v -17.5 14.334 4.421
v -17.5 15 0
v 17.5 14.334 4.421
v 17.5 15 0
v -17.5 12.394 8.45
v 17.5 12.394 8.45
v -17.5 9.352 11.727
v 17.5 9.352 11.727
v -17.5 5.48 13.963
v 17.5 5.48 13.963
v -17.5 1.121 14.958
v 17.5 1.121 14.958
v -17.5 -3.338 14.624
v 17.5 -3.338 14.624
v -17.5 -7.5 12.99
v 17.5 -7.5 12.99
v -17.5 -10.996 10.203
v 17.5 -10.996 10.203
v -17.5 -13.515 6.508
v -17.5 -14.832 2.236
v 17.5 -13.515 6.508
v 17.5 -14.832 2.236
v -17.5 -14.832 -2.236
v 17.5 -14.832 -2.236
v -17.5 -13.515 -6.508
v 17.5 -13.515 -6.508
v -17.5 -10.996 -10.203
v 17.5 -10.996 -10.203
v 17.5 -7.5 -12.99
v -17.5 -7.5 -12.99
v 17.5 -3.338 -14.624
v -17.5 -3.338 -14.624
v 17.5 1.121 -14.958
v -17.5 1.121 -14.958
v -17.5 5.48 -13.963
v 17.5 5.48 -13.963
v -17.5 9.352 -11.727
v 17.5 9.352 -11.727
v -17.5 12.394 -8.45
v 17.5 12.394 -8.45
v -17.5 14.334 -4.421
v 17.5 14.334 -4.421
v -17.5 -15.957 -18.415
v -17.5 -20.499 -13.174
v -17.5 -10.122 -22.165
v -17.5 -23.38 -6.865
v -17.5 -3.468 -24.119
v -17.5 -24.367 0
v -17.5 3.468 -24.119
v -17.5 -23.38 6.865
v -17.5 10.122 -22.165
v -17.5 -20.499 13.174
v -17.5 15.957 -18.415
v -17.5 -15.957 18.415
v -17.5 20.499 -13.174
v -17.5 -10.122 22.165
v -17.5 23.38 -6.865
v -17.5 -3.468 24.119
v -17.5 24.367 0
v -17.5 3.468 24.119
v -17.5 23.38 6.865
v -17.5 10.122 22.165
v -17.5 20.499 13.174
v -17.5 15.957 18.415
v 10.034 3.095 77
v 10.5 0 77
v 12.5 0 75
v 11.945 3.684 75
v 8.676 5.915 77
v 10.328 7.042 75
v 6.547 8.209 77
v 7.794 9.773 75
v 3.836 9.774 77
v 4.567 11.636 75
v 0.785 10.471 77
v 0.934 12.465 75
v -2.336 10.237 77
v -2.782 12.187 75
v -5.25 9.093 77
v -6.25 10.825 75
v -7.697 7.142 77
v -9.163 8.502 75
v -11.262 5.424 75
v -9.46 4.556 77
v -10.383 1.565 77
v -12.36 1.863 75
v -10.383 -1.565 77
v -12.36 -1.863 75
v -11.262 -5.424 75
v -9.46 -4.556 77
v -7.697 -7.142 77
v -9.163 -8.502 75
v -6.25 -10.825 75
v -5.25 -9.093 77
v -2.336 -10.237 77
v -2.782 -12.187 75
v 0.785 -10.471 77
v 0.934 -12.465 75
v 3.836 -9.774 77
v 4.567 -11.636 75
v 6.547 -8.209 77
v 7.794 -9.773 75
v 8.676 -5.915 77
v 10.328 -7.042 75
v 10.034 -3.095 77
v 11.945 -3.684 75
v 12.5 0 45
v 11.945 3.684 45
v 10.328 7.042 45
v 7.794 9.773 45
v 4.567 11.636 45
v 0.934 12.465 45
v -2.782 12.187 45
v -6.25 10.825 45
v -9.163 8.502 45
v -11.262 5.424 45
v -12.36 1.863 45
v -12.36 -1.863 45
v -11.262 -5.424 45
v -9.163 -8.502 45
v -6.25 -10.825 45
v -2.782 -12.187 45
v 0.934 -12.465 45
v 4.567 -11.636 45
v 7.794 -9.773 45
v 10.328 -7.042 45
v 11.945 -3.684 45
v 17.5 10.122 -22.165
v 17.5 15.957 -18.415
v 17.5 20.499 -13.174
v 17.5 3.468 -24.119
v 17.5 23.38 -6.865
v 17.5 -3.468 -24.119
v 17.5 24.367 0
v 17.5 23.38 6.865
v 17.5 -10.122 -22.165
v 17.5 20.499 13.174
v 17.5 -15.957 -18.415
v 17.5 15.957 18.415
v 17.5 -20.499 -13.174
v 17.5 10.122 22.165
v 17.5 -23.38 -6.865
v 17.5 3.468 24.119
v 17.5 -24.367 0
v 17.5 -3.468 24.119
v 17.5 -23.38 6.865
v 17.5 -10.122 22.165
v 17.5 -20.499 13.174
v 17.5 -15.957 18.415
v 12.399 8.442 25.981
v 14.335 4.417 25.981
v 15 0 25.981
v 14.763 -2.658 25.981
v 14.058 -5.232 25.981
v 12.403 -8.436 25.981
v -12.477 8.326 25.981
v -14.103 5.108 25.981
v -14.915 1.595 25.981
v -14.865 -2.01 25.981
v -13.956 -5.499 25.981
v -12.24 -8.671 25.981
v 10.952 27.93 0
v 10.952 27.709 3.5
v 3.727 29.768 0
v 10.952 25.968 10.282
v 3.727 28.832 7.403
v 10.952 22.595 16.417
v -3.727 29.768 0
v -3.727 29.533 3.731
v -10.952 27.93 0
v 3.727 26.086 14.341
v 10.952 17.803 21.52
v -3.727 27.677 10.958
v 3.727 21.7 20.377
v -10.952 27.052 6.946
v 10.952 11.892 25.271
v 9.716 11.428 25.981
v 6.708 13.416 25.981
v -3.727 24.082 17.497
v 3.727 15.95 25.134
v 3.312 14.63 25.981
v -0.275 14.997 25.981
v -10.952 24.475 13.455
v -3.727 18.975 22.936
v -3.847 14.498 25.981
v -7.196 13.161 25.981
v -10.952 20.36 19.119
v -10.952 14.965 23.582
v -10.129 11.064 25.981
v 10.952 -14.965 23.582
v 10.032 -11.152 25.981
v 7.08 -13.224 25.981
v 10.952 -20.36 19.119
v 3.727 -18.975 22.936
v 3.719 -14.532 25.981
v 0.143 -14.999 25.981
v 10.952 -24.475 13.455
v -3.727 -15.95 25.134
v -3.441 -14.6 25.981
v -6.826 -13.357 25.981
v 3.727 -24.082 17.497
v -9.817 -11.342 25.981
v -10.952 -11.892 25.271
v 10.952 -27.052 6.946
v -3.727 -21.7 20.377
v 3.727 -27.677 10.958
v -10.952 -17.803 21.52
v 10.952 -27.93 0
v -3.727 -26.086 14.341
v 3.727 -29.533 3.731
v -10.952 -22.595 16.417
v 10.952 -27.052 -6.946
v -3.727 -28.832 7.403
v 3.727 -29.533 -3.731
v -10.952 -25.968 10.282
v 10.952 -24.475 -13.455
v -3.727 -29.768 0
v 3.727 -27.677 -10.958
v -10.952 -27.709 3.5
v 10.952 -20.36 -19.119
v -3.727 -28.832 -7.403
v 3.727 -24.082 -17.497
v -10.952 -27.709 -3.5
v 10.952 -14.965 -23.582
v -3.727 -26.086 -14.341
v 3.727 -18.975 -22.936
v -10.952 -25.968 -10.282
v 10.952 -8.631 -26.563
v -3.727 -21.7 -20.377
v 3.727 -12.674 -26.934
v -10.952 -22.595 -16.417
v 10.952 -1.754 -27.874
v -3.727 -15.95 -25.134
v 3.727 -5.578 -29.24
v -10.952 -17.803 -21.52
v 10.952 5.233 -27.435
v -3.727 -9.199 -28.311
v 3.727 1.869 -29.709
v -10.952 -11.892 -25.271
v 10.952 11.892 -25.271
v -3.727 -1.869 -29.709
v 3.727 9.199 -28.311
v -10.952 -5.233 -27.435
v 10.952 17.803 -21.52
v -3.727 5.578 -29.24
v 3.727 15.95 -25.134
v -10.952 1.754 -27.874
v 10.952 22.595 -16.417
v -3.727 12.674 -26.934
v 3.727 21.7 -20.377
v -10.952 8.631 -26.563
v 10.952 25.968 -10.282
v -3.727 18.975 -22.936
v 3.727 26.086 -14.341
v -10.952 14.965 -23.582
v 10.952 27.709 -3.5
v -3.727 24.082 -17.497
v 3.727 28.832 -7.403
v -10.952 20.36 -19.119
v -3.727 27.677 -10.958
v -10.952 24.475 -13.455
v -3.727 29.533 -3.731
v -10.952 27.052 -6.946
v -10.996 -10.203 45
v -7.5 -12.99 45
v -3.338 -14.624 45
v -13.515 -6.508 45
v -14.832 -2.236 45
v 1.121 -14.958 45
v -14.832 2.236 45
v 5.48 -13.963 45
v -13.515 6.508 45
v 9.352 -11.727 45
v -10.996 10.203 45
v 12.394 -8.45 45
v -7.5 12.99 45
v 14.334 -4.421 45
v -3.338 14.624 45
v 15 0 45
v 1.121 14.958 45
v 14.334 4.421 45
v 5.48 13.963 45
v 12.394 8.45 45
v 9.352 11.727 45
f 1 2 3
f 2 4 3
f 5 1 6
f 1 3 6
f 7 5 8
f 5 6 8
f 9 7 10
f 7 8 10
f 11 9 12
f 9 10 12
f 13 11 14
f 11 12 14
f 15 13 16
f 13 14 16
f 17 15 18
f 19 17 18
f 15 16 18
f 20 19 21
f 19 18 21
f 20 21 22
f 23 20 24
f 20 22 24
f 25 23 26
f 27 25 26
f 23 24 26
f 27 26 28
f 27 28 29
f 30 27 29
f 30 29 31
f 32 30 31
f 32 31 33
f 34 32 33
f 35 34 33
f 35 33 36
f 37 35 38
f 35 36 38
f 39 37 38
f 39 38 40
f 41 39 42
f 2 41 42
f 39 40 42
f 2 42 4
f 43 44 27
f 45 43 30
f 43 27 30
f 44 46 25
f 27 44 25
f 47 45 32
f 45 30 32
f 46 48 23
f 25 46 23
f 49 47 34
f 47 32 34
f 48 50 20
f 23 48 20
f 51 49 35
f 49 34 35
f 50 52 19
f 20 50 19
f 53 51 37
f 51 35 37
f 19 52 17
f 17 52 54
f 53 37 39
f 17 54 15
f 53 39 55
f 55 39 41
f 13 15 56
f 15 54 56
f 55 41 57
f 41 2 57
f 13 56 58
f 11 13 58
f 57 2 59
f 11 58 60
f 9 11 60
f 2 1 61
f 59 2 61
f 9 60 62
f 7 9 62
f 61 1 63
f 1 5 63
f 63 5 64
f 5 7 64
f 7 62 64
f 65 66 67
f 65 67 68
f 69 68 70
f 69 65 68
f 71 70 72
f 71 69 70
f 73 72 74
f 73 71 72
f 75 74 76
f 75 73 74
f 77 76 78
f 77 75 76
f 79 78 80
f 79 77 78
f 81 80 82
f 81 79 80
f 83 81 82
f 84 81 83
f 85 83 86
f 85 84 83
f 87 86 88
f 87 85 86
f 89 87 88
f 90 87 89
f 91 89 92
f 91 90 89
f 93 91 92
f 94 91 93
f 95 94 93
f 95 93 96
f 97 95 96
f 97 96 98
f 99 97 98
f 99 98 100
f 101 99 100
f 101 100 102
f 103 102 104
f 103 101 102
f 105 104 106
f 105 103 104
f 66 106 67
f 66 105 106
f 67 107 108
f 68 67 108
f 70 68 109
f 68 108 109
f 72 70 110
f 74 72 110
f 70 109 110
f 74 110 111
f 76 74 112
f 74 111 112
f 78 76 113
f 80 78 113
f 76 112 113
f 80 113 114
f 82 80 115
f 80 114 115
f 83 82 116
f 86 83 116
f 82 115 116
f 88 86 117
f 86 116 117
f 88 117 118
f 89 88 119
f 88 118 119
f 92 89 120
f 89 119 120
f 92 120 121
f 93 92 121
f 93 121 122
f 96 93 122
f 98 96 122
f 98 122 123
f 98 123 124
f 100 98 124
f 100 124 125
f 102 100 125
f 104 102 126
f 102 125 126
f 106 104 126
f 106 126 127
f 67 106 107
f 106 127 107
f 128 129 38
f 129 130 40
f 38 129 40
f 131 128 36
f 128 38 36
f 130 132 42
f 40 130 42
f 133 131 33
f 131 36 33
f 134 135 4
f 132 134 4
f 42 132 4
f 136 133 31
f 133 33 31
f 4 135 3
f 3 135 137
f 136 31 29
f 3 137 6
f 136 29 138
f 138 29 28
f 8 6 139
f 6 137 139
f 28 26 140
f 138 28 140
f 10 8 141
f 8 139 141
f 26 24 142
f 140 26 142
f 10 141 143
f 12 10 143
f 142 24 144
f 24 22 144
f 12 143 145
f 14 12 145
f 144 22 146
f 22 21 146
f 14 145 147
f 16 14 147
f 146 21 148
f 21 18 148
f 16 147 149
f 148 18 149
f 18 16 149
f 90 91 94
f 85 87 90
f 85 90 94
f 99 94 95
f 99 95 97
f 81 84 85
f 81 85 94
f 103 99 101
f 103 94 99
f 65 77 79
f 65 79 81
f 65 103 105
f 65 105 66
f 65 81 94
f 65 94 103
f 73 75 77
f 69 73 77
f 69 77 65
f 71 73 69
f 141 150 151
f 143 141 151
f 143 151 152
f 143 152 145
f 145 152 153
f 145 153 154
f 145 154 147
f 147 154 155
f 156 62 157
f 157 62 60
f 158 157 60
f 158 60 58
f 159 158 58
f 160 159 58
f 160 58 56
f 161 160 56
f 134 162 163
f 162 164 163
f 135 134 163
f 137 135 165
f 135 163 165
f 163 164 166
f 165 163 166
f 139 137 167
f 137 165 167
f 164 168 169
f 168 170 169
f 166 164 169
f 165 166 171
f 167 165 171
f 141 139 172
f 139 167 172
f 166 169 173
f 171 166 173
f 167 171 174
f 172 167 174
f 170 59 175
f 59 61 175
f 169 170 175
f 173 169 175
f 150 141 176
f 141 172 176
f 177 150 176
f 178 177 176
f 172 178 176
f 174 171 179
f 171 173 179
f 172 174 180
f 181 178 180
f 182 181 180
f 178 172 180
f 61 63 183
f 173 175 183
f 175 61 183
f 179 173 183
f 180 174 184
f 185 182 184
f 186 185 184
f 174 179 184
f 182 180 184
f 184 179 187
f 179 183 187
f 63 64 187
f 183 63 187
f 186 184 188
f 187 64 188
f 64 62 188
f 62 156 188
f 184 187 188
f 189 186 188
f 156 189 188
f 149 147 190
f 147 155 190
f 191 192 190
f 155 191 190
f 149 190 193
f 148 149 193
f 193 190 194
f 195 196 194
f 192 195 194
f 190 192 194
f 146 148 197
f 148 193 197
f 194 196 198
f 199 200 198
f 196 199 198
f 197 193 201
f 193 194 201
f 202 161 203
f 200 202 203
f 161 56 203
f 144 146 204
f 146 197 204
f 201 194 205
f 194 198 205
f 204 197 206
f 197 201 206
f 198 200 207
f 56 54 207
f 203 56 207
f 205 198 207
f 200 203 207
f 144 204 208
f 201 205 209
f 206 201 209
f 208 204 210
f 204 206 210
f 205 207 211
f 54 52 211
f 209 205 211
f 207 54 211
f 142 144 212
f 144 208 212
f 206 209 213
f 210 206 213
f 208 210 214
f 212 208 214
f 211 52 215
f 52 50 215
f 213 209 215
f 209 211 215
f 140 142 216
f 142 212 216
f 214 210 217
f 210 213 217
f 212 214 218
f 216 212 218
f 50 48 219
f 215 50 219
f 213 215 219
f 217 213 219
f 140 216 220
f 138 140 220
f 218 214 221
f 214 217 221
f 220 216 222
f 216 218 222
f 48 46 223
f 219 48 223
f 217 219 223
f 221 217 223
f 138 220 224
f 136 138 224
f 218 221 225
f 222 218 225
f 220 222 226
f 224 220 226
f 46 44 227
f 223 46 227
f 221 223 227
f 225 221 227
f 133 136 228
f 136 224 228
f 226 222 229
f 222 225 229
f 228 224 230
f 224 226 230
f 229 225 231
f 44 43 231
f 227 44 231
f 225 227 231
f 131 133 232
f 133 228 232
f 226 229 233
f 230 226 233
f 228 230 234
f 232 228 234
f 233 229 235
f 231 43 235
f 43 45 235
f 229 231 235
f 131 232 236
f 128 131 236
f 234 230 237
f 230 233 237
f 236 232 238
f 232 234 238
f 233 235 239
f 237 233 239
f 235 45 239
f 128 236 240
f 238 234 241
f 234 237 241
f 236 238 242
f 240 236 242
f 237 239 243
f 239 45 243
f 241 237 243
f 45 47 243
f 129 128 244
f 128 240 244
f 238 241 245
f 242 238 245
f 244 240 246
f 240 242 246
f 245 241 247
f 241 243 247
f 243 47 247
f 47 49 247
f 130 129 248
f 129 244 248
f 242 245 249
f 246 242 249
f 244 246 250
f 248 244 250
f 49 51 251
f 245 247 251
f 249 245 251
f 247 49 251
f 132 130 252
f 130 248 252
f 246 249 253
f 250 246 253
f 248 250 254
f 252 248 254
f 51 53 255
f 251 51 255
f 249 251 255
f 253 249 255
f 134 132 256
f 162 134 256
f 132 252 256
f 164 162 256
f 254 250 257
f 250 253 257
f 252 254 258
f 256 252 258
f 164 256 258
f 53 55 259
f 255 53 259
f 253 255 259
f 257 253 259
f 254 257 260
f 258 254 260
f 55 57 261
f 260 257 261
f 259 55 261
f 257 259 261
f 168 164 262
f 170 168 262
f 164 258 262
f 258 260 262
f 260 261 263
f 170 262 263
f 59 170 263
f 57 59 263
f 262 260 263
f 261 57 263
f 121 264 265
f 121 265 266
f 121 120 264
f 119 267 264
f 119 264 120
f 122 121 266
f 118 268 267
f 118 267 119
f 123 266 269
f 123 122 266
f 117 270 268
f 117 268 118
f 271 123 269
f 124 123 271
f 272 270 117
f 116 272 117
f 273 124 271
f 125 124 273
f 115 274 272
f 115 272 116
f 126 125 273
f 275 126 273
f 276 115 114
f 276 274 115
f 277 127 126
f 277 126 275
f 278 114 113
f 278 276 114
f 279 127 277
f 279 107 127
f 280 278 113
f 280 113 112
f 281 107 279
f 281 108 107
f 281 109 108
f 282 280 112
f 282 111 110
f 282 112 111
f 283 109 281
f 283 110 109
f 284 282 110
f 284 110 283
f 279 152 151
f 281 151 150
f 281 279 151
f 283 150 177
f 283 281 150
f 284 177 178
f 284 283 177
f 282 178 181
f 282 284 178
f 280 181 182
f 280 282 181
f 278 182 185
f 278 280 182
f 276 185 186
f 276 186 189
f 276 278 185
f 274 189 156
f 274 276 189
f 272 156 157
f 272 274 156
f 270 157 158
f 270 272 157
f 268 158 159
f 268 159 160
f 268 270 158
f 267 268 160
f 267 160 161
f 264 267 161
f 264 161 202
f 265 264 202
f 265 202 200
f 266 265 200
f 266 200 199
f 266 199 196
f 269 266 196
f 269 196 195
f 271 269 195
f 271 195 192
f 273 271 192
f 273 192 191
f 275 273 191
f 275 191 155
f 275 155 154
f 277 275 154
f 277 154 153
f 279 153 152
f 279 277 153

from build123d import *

# Parameters (mm, degrees)
P_IDAT_VYSUNUT_M1_REACH = 77
SKICA4_R                = 15
SKICA5_R                = 12.5
P_IDAT_VYSUNUT_M2_DEPTH = 32
ZKOSEN_1_SIZE           = 2


with BuildPart() as part:
    # Skica1 → Rotovat1 (revolve)
    with BuildSketch(Plane.XY):
        with BuildLine():
            ThreePointArc((17.5, 24.366985862), (0, 30), (-17.5, 24.366985862))
            Line((-17.5, 24.366985862), (-17.5, 15))
            Line((-17.5, 15), (17.5, 15))
            Line((17.5, 15), (17.5, 24.366985862))
        make_face()
    revolve(axis=Axis((-37.473333333, 0, 0), (1, 0, 0)))

    # Skica4 → Přidat vysunutím1 (add, up to next)
    with BuildSketch(Plane.XY.offset(45), mode=Mode.PRIVATE) as p_idat_vysunut_m1_sk1:
        Circle(SKICA4_R)
    p_idat_vysunut_m1_tool1 = extrude(p_idat_vysunut_m1_sk1.sketch, amount=-P_IDAT_VYSUNUT_M1_REACH, mode=Mode.PRIVATE) - part.part
    add(p_idat_vysunut_m1_tool1.solids().sort_by_distance((0, 0, 45))[0])

    # Skica5 → Přidat vysunutím2 (add)
    with BuildSketch(Plane.XY.offset(45)):
        Circle(SKICA5_R)
    extrude(amount=P_IDAT_VYSUNUT_M2_DEPTH)

    # Zkosení1
    zkosen_1_edges = [part.edges().sort_by_distance(p)[0] for p in [
        (-12.5, 0, 77),
    ]]
    chamfer(zkosen_1_edges, length=ZKOSEN_1_SIZE)


solid = part.part
